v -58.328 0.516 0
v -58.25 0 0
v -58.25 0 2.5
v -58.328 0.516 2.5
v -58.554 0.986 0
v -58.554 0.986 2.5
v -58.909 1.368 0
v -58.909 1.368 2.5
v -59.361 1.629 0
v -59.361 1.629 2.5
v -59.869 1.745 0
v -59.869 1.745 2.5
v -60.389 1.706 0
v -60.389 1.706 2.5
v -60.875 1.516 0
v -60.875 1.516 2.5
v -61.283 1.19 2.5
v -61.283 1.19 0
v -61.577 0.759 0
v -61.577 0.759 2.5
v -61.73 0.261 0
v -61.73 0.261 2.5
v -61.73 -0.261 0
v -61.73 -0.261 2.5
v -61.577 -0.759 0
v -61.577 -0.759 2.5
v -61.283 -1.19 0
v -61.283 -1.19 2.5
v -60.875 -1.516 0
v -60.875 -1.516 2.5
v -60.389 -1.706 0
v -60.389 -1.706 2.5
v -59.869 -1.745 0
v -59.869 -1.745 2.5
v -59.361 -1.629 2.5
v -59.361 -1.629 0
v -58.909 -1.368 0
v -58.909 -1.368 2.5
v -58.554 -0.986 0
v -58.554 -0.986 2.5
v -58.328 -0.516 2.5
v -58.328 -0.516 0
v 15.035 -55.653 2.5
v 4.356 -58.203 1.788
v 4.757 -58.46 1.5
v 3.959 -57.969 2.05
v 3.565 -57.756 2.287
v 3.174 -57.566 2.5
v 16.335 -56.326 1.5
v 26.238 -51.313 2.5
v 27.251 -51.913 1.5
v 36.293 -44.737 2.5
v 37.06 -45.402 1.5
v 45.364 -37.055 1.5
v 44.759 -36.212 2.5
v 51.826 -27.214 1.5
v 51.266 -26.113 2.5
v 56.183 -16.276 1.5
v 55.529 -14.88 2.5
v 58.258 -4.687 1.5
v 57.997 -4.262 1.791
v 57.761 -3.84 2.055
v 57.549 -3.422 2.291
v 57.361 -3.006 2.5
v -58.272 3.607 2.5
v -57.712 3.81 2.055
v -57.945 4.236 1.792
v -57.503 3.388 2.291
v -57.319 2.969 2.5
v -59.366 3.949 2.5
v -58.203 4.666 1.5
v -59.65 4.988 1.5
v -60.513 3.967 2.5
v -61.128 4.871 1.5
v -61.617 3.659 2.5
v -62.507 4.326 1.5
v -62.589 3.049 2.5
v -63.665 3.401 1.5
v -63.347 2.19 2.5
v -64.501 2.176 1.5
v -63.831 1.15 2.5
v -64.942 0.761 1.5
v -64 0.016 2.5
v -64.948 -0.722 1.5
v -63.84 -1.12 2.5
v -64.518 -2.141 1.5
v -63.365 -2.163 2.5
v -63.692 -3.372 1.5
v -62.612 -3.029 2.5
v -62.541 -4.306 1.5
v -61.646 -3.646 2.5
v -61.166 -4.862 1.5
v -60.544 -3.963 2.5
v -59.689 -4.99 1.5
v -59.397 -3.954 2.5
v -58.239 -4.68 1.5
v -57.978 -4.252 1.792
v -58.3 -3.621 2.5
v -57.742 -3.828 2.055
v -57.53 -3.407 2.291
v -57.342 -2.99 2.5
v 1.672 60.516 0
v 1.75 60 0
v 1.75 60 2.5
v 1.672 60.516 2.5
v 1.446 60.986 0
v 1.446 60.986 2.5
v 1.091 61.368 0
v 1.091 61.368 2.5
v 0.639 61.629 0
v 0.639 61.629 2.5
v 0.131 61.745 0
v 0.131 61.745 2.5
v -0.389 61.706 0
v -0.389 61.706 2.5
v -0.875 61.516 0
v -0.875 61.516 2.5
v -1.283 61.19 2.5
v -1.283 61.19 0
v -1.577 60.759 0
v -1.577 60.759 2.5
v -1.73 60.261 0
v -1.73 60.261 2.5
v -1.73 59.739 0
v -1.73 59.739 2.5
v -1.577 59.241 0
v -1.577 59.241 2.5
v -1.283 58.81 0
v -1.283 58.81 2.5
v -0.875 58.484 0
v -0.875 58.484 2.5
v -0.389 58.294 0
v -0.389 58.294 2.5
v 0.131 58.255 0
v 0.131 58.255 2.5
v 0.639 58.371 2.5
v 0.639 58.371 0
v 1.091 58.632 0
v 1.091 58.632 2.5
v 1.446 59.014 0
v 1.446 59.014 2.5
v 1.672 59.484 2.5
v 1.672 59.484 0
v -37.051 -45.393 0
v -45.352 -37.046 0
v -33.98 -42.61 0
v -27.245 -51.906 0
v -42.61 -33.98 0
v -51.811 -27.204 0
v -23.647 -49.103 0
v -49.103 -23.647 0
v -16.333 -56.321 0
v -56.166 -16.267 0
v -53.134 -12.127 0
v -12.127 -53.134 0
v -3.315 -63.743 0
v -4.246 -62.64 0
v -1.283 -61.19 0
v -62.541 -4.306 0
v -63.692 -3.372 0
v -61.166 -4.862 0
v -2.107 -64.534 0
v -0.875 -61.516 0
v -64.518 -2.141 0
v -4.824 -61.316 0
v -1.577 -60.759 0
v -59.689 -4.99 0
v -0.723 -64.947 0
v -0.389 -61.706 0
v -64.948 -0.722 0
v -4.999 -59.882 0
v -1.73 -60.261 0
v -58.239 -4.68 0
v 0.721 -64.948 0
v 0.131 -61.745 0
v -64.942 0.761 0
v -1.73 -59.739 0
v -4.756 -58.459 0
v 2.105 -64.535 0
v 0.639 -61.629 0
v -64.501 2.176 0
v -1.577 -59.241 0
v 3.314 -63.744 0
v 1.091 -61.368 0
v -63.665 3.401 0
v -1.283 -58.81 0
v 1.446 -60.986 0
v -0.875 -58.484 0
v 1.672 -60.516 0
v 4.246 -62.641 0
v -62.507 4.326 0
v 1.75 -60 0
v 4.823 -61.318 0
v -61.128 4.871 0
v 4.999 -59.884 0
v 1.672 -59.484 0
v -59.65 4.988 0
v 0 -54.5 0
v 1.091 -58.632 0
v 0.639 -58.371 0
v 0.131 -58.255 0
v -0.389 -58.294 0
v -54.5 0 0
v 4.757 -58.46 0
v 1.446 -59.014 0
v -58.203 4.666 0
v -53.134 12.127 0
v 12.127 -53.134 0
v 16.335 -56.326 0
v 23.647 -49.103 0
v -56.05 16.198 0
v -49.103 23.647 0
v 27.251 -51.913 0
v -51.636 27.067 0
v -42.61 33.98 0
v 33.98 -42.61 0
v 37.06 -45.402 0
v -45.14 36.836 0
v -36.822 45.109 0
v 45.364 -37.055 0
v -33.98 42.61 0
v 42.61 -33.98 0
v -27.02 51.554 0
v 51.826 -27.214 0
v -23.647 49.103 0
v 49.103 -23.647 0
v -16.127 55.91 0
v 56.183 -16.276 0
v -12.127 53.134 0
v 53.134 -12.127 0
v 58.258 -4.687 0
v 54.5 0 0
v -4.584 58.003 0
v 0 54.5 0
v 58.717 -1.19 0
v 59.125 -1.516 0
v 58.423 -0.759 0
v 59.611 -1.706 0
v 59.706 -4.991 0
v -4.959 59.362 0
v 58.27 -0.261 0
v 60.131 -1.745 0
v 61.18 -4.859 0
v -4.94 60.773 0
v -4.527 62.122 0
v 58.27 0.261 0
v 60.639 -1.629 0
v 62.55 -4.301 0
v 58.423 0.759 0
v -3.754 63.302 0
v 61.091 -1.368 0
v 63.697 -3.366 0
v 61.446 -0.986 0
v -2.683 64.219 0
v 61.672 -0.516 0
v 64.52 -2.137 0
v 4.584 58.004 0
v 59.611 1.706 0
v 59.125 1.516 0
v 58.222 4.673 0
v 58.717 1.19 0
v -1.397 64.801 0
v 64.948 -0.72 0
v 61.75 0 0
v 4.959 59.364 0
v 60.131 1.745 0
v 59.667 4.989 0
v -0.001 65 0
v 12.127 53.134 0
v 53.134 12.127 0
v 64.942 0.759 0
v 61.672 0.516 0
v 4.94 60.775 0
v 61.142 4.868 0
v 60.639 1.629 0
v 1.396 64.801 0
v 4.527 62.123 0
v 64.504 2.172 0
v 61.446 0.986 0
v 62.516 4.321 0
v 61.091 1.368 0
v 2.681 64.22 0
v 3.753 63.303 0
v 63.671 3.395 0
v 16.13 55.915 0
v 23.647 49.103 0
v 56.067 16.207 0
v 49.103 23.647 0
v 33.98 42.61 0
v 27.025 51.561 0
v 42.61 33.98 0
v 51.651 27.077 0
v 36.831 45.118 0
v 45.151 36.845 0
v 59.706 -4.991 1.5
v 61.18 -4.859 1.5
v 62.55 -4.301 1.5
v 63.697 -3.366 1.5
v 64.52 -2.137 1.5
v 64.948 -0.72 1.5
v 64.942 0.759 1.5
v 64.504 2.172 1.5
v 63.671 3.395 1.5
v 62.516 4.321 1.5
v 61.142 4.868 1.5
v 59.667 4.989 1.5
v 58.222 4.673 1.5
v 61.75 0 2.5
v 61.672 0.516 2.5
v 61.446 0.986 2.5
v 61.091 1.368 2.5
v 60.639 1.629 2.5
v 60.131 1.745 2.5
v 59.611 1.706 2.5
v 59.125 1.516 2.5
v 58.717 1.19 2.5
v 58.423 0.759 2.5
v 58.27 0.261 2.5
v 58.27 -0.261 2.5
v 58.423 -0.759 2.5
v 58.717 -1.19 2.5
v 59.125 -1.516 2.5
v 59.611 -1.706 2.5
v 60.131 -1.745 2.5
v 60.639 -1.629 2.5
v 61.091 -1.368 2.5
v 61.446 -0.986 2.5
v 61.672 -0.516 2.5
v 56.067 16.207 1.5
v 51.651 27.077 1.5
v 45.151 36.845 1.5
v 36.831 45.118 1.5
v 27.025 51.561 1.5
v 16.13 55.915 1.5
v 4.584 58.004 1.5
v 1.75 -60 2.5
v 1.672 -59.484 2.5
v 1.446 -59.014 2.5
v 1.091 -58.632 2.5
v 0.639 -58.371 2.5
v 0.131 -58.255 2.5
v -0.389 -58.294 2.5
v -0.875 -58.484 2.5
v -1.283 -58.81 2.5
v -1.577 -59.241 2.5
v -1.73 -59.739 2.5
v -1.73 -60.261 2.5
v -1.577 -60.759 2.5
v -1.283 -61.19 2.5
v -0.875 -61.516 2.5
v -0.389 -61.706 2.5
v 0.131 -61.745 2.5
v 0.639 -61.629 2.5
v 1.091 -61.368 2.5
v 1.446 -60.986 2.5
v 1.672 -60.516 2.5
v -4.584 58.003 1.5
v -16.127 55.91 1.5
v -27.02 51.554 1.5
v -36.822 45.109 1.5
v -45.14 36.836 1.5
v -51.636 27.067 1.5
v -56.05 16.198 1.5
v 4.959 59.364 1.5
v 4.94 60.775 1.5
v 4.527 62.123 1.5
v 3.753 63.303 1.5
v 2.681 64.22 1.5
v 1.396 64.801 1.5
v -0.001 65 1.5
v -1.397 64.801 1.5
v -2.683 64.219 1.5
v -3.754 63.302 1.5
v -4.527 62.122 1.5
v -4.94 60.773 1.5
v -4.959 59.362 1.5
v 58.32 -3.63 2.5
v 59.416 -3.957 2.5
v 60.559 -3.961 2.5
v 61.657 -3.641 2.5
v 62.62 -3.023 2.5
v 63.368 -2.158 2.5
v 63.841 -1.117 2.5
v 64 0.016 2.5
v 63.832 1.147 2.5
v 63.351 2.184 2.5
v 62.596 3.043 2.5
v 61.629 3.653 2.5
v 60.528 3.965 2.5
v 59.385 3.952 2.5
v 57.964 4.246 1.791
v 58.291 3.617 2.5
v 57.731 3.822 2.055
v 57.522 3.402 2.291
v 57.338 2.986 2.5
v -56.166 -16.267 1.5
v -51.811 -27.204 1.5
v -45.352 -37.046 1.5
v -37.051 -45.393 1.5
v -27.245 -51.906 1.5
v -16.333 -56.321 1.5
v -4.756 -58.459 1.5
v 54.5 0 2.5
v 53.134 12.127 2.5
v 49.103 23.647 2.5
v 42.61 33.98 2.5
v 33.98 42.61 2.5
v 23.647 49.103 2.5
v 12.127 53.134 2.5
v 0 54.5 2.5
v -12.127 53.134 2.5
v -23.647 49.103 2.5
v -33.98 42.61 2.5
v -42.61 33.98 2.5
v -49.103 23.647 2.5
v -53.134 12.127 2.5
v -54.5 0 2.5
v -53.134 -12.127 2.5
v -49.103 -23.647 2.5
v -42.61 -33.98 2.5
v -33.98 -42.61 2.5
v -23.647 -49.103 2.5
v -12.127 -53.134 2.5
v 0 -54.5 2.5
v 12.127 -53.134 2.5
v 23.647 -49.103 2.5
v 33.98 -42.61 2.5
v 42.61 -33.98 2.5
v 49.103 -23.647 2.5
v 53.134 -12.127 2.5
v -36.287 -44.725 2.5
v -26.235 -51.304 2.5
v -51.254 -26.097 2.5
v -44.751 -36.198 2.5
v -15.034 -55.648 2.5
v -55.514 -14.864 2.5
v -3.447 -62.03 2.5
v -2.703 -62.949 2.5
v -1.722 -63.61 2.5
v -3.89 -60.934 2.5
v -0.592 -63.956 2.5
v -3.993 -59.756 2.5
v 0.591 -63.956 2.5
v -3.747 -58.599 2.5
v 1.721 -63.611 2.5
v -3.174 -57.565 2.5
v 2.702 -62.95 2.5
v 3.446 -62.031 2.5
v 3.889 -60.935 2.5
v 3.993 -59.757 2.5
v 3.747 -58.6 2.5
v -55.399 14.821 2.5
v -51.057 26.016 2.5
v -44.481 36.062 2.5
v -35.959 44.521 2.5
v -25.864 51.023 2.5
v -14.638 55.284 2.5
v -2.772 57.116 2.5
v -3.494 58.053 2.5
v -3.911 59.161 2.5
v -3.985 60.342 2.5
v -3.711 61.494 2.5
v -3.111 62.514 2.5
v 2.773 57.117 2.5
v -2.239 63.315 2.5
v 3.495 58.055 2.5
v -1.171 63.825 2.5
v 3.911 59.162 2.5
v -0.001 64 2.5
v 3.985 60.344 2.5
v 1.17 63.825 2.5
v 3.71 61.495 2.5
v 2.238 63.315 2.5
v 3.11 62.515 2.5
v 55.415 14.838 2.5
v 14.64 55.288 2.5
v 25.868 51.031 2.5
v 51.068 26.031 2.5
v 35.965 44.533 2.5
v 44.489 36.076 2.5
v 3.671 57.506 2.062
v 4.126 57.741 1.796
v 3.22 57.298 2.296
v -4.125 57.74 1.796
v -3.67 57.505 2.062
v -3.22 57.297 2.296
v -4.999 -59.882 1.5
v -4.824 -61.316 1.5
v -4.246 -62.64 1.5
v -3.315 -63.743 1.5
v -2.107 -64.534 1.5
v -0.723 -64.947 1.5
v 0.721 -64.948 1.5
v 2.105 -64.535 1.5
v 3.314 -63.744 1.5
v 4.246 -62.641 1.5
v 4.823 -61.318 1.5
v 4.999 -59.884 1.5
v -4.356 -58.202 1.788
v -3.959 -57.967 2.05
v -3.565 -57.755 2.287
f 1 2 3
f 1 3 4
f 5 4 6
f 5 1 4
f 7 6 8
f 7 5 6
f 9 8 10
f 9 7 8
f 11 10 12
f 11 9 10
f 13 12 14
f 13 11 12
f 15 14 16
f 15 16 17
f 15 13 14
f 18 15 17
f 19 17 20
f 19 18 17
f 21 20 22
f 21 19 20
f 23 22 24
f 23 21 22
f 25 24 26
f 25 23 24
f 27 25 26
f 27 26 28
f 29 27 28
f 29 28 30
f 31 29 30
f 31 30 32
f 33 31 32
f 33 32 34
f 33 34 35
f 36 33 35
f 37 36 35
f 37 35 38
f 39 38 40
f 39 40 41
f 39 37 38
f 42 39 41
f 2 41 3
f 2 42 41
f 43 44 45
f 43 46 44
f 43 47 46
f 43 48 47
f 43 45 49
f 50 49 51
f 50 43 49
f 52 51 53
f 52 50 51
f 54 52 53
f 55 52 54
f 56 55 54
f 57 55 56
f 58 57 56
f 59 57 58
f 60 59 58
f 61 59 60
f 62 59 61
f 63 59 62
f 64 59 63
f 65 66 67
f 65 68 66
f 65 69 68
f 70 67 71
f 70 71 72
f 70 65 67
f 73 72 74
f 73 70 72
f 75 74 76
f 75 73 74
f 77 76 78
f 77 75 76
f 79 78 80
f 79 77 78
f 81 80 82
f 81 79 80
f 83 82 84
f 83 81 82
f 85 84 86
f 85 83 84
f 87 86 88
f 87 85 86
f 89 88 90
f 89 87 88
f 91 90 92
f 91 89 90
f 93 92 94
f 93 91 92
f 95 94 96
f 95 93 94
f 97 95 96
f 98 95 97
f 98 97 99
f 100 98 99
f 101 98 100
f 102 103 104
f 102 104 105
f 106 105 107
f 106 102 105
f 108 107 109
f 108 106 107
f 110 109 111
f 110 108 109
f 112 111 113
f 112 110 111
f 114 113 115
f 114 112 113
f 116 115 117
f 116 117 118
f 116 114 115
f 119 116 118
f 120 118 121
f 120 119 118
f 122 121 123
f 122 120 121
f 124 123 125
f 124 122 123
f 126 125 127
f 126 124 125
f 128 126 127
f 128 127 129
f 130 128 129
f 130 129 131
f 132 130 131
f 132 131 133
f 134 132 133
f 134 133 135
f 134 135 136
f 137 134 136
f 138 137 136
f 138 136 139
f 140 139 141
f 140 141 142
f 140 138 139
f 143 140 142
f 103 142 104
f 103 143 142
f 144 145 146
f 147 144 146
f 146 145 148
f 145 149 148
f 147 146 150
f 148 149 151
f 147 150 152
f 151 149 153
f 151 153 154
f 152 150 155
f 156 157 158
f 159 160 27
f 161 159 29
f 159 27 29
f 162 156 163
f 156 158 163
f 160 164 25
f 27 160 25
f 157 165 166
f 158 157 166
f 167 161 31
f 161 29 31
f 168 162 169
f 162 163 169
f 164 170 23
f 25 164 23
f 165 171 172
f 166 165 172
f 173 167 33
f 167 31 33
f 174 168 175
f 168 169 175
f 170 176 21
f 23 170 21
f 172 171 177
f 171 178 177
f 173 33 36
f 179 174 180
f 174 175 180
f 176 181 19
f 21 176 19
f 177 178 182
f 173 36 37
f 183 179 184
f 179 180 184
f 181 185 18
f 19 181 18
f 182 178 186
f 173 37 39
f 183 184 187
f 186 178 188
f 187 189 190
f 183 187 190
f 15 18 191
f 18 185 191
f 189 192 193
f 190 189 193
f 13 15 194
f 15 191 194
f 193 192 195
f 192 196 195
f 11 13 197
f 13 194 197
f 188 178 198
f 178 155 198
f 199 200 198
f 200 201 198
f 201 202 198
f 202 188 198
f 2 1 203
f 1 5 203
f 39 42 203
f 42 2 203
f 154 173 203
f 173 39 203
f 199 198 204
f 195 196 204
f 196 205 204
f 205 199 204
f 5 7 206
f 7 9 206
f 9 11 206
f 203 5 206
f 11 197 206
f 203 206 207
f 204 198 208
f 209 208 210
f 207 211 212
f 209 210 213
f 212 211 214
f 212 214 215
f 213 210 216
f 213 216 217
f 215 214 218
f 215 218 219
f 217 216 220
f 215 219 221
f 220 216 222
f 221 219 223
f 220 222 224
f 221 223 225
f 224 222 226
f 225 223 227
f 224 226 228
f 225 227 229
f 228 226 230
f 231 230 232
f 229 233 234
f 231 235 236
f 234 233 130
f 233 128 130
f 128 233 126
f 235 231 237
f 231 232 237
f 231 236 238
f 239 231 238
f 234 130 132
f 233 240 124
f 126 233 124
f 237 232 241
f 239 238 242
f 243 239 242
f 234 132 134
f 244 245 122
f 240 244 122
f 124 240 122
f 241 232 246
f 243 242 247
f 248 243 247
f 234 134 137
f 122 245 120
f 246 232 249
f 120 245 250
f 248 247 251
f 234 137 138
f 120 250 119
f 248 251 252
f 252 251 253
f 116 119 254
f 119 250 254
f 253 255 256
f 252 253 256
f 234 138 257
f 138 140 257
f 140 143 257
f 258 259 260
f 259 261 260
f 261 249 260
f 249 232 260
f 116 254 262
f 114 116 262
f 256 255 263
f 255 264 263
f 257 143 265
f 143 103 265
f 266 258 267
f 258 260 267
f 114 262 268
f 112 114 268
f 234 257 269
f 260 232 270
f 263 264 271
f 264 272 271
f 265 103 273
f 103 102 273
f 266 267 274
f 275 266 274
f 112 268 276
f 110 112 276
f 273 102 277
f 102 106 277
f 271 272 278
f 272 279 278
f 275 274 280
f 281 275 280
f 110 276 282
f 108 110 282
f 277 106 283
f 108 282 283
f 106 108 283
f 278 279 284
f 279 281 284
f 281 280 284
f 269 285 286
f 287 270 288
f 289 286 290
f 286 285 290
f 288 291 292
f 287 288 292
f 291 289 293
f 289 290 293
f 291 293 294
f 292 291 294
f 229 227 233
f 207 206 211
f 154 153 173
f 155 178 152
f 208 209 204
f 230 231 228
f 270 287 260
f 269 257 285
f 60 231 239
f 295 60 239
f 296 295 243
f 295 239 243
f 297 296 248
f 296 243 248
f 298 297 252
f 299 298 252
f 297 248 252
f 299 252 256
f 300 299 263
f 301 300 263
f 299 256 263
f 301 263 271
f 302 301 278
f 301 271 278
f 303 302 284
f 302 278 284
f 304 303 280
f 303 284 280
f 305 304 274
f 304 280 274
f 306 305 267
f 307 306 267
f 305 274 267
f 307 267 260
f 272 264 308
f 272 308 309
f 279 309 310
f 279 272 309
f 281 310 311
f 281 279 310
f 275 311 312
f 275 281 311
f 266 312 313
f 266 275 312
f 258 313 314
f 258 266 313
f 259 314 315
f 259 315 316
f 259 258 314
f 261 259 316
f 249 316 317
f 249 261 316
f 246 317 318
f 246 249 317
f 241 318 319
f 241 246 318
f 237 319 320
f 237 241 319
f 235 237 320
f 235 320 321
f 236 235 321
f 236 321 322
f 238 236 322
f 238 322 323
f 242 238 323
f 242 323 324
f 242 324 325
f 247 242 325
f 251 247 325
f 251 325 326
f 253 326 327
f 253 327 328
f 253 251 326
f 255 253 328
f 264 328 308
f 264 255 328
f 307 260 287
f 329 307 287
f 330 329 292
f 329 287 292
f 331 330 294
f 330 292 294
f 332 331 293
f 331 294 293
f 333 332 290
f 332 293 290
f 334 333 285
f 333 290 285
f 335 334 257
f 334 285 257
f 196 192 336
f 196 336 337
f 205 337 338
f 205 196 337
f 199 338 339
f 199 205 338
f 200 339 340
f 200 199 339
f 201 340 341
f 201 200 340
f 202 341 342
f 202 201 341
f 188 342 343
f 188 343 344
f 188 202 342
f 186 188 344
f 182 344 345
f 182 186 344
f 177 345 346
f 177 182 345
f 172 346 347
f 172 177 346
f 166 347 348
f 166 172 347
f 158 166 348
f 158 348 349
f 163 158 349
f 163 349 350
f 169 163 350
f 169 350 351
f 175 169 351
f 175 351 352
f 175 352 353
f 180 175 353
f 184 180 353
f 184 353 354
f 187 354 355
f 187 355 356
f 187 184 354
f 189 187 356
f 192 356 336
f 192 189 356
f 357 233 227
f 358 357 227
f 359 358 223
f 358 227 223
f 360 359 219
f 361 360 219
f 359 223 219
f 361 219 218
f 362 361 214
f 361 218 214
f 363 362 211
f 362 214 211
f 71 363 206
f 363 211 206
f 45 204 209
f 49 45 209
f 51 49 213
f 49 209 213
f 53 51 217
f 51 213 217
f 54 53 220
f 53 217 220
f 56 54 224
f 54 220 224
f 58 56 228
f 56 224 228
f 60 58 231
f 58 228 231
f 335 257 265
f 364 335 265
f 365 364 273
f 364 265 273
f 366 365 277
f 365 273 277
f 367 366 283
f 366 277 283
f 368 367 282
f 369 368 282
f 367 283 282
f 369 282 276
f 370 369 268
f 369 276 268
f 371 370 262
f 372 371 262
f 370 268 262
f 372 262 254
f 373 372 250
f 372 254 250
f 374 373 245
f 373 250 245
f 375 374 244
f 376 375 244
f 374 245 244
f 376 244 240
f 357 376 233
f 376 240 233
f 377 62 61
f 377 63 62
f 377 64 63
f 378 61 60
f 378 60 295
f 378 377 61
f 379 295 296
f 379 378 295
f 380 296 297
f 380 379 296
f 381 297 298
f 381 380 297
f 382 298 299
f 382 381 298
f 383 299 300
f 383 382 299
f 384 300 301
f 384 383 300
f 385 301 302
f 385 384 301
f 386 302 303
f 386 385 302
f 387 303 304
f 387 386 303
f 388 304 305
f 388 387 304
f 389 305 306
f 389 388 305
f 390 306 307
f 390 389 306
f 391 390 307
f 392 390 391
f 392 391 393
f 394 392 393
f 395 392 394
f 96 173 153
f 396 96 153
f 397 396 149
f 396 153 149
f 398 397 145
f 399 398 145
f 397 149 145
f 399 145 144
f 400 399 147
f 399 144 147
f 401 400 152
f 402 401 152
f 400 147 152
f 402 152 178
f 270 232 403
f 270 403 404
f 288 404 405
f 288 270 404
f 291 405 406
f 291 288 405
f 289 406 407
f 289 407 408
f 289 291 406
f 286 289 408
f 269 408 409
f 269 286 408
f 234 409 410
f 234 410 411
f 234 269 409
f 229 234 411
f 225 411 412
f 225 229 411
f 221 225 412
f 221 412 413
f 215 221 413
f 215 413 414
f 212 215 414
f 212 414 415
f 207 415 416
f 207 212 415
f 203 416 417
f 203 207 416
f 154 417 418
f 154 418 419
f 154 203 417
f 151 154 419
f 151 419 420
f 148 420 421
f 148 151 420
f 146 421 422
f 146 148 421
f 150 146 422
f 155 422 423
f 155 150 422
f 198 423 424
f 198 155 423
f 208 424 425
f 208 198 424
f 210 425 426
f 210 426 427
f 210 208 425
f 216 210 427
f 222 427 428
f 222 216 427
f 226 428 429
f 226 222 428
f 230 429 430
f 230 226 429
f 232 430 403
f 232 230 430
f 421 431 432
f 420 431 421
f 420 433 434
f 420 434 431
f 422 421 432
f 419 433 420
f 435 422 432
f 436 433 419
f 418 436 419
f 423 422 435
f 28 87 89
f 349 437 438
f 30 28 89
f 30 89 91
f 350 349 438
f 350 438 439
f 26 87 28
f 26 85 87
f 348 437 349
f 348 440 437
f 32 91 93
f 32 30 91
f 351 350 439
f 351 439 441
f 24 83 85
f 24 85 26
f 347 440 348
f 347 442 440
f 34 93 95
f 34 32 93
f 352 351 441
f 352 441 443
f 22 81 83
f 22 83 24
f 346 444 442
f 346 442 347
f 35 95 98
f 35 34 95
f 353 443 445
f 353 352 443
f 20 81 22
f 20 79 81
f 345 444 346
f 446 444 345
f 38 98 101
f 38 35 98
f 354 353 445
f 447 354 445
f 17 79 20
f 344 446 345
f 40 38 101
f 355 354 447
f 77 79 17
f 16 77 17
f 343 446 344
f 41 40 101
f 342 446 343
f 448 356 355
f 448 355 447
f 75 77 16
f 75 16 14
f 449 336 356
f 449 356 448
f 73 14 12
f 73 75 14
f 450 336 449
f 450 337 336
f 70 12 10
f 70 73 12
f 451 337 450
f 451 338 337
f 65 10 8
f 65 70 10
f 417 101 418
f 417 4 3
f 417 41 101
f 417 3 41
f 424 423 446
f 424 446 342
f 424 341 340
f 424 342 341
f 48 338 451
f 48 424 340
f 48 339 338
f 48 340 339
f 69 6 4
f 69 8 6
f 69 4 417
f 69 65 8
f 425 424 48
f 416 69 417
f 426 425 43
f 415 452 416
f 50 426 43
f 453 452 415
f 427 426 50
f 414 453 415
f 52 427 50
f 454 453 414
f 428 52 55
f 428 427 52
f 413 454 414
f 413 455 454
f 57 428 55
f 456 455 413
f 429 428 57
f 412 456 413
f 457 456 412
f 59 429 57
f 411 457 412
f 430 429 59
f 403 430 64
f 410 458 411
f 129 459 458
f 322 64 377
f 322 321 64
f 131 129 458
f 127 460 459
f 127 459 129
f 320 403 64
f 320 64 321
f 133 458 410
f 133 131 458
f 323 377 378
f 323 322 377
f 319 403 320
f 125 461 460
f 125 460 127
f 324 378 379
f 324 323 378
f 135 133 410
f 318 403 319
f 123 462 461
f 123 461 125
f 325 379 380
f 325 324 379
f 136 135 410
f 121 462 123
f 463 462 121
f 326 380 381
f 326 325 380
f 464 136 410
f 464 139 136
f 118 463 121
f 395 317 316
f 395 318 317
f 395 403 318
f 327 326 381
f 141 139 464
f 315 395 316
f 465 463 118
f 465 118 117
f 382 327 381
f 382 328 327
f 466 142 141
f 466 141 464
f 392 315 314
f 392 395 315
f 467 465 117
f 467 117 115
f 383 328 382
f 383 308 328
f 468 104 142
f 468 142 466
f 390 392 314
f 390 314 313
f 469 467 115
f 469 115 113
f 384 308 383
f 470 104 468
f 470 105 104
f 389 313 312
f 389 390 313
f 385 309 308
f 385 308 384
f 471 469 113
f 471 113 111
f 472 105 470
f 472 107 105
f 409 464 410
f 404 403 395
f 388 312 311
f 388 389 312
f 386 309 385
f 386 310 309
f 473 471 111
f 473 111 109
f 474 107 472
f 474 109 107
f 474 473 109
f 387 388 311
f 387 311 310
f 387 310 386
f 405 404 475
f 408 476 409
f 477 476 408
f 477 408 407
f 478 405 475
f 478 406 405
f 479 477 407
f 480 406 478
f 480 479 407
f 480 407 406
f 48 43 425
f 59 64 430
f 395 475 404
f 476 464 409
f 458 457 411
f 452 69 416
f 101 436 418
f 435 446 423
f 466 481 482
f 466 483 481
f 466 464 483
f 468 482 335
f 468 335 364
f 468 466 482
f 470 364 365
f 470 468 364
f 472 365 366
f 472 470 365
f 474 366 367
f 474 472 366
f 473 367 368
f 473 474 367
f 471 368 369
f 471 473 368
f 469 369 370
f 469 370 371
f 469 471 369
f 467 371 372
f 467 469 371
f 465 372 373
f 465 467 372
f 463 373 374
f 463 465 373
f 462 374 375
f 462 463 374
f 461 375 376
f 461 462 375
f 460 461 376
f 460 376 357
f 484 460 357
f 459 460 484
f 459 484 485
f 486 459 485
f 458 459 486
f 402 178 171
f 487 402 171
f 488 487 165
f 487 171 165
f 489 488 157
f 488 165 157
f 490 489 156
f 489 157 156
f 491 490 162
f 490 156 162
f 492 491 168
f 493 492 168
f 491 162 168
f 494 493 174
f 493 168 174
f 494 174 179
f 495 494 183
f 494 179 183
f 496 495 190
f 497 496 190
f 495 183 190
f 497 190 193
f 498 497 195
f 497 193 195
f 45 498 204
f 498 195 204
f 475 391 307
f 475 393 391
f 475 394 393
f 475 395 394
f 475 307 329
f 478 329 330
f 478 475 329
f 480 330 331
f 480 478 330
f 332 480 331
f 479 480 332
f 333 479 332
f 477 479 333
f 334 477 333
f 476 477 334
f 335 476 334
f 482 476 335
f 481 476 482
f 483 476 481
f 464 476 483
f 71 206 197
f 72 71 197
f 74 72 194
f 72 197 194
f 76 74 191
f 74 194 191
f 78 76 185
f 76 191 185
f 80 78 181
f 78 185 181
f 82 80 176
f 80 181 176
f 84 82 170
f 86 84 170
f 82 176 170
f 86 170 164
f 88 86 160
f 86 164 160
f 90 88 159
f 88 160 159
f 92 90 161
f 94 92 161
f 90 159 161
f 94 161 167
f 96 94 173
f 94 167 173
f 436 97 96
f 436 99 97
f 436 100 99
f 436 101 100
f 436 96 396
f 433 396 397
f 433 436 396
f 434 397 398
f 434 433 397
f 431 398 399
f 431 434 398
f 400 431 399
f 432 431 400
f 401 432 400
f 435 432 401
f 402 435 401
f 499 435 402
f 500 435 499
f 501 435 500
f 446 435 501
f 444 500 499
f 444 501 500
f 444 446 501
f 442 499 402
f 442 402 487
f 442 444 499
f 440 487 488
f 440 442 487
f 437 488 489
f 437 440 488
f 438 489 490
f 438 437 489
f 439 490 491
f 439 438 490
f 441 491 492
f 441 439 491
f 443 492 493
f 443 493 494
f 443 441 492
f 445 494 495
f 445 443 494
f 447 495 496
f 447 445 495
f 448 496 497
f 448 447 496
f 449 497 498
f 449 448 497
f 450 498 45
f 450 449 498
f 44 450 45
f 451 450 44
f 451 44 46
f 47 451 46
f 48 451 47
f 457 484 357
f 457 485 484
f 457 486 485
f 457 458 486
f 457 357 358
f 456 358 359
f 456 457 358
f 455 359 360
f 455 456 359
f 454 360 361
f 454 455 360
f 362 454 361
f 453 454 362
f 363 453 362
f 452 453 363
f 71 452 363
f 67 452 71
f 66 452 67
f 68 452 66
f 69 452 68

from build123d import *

# Parameters (mm, degrees)
SKETCH_R     = 54.5
SKETCH_R_2   = 1.75
PAD_DEPTH    = 2.5
CHAMFER_SIZE = 1


with BuildPart() as part:
    # Sketch → Pad (new body)
    with BuildSketch(Plane.XY):
        with BuildLine():
            ThreePointArc((4.584354, 58.00408), (-0.000818, 65), (-4.583701, 58.00258))
            ThreePointArc((-4.583701, 58.00258), (-41.189101, 41.181927), (-58.202656, 4.665785))
            ThreePointArc((-58.202656, 4.665785), (-64.999962, 0.019578), (-58.239249, -4.679717))
            ThreePointArc((-58.239249, -4.679717), (-41.41212, -41.428831), (-4.756492, -58.458643))
            ThreePointArc((-4.756492, -58.458643), (-0.000824, -65), (4.757, -58.460212))
            ThreePointArc((4.757, -58.460212), (41.4225, -41.438205), (58.258407, -4.686881))
            ThreePointArc((58.258407, -4.686881), (64.999962, 0.019584), (58.221745, 4.673094))
            ThreePointArc((58.221745, 4.673094), (41.19943, 41.191251), (4.584354, 58.00408))
        make_face()
        Circle(SKETCH_R, mode=Mode.SUBTRACT)
        with Locations((0, 60)):
            Circle(SKETCH_R_2, mode=Mode.SUBTRACT)
        with Locations((0, -60)):
            Circle(SKETCH_R_2, mode=Mode.SUBTRACT)
        with Locations((-60, 0)):
            Circle(SKETCH_R_2, mode=Mode.SUBTRACT)
        with Locations((60, 0)):
            Circle(SKETCH_R_2, mode=Mode.SUBTRACT)
    extrude(amount=PAD_DEPTH)

    # Chamfer
    chamfer_edges = [part.edges().sort_by_distance(p)[0] for p in [
        (41.4225, -41.438205, 2.5),
        (-0.000824, -65, 2.5),
        (-41.41212, -41.428831, 2.5),
        (-64.999962, 0.019578, 2.5),
        (-41.189101, 41.181927, 2.5),
        (64.999962, 0.019584, 2.5),
        (41.19943, 41.191251, 2.5),
        (-0.000818, 65, 2.5),
    ]]
    chamfer(chamfer_edges, length=CHAMFER_SIZE)


solid = part.part
